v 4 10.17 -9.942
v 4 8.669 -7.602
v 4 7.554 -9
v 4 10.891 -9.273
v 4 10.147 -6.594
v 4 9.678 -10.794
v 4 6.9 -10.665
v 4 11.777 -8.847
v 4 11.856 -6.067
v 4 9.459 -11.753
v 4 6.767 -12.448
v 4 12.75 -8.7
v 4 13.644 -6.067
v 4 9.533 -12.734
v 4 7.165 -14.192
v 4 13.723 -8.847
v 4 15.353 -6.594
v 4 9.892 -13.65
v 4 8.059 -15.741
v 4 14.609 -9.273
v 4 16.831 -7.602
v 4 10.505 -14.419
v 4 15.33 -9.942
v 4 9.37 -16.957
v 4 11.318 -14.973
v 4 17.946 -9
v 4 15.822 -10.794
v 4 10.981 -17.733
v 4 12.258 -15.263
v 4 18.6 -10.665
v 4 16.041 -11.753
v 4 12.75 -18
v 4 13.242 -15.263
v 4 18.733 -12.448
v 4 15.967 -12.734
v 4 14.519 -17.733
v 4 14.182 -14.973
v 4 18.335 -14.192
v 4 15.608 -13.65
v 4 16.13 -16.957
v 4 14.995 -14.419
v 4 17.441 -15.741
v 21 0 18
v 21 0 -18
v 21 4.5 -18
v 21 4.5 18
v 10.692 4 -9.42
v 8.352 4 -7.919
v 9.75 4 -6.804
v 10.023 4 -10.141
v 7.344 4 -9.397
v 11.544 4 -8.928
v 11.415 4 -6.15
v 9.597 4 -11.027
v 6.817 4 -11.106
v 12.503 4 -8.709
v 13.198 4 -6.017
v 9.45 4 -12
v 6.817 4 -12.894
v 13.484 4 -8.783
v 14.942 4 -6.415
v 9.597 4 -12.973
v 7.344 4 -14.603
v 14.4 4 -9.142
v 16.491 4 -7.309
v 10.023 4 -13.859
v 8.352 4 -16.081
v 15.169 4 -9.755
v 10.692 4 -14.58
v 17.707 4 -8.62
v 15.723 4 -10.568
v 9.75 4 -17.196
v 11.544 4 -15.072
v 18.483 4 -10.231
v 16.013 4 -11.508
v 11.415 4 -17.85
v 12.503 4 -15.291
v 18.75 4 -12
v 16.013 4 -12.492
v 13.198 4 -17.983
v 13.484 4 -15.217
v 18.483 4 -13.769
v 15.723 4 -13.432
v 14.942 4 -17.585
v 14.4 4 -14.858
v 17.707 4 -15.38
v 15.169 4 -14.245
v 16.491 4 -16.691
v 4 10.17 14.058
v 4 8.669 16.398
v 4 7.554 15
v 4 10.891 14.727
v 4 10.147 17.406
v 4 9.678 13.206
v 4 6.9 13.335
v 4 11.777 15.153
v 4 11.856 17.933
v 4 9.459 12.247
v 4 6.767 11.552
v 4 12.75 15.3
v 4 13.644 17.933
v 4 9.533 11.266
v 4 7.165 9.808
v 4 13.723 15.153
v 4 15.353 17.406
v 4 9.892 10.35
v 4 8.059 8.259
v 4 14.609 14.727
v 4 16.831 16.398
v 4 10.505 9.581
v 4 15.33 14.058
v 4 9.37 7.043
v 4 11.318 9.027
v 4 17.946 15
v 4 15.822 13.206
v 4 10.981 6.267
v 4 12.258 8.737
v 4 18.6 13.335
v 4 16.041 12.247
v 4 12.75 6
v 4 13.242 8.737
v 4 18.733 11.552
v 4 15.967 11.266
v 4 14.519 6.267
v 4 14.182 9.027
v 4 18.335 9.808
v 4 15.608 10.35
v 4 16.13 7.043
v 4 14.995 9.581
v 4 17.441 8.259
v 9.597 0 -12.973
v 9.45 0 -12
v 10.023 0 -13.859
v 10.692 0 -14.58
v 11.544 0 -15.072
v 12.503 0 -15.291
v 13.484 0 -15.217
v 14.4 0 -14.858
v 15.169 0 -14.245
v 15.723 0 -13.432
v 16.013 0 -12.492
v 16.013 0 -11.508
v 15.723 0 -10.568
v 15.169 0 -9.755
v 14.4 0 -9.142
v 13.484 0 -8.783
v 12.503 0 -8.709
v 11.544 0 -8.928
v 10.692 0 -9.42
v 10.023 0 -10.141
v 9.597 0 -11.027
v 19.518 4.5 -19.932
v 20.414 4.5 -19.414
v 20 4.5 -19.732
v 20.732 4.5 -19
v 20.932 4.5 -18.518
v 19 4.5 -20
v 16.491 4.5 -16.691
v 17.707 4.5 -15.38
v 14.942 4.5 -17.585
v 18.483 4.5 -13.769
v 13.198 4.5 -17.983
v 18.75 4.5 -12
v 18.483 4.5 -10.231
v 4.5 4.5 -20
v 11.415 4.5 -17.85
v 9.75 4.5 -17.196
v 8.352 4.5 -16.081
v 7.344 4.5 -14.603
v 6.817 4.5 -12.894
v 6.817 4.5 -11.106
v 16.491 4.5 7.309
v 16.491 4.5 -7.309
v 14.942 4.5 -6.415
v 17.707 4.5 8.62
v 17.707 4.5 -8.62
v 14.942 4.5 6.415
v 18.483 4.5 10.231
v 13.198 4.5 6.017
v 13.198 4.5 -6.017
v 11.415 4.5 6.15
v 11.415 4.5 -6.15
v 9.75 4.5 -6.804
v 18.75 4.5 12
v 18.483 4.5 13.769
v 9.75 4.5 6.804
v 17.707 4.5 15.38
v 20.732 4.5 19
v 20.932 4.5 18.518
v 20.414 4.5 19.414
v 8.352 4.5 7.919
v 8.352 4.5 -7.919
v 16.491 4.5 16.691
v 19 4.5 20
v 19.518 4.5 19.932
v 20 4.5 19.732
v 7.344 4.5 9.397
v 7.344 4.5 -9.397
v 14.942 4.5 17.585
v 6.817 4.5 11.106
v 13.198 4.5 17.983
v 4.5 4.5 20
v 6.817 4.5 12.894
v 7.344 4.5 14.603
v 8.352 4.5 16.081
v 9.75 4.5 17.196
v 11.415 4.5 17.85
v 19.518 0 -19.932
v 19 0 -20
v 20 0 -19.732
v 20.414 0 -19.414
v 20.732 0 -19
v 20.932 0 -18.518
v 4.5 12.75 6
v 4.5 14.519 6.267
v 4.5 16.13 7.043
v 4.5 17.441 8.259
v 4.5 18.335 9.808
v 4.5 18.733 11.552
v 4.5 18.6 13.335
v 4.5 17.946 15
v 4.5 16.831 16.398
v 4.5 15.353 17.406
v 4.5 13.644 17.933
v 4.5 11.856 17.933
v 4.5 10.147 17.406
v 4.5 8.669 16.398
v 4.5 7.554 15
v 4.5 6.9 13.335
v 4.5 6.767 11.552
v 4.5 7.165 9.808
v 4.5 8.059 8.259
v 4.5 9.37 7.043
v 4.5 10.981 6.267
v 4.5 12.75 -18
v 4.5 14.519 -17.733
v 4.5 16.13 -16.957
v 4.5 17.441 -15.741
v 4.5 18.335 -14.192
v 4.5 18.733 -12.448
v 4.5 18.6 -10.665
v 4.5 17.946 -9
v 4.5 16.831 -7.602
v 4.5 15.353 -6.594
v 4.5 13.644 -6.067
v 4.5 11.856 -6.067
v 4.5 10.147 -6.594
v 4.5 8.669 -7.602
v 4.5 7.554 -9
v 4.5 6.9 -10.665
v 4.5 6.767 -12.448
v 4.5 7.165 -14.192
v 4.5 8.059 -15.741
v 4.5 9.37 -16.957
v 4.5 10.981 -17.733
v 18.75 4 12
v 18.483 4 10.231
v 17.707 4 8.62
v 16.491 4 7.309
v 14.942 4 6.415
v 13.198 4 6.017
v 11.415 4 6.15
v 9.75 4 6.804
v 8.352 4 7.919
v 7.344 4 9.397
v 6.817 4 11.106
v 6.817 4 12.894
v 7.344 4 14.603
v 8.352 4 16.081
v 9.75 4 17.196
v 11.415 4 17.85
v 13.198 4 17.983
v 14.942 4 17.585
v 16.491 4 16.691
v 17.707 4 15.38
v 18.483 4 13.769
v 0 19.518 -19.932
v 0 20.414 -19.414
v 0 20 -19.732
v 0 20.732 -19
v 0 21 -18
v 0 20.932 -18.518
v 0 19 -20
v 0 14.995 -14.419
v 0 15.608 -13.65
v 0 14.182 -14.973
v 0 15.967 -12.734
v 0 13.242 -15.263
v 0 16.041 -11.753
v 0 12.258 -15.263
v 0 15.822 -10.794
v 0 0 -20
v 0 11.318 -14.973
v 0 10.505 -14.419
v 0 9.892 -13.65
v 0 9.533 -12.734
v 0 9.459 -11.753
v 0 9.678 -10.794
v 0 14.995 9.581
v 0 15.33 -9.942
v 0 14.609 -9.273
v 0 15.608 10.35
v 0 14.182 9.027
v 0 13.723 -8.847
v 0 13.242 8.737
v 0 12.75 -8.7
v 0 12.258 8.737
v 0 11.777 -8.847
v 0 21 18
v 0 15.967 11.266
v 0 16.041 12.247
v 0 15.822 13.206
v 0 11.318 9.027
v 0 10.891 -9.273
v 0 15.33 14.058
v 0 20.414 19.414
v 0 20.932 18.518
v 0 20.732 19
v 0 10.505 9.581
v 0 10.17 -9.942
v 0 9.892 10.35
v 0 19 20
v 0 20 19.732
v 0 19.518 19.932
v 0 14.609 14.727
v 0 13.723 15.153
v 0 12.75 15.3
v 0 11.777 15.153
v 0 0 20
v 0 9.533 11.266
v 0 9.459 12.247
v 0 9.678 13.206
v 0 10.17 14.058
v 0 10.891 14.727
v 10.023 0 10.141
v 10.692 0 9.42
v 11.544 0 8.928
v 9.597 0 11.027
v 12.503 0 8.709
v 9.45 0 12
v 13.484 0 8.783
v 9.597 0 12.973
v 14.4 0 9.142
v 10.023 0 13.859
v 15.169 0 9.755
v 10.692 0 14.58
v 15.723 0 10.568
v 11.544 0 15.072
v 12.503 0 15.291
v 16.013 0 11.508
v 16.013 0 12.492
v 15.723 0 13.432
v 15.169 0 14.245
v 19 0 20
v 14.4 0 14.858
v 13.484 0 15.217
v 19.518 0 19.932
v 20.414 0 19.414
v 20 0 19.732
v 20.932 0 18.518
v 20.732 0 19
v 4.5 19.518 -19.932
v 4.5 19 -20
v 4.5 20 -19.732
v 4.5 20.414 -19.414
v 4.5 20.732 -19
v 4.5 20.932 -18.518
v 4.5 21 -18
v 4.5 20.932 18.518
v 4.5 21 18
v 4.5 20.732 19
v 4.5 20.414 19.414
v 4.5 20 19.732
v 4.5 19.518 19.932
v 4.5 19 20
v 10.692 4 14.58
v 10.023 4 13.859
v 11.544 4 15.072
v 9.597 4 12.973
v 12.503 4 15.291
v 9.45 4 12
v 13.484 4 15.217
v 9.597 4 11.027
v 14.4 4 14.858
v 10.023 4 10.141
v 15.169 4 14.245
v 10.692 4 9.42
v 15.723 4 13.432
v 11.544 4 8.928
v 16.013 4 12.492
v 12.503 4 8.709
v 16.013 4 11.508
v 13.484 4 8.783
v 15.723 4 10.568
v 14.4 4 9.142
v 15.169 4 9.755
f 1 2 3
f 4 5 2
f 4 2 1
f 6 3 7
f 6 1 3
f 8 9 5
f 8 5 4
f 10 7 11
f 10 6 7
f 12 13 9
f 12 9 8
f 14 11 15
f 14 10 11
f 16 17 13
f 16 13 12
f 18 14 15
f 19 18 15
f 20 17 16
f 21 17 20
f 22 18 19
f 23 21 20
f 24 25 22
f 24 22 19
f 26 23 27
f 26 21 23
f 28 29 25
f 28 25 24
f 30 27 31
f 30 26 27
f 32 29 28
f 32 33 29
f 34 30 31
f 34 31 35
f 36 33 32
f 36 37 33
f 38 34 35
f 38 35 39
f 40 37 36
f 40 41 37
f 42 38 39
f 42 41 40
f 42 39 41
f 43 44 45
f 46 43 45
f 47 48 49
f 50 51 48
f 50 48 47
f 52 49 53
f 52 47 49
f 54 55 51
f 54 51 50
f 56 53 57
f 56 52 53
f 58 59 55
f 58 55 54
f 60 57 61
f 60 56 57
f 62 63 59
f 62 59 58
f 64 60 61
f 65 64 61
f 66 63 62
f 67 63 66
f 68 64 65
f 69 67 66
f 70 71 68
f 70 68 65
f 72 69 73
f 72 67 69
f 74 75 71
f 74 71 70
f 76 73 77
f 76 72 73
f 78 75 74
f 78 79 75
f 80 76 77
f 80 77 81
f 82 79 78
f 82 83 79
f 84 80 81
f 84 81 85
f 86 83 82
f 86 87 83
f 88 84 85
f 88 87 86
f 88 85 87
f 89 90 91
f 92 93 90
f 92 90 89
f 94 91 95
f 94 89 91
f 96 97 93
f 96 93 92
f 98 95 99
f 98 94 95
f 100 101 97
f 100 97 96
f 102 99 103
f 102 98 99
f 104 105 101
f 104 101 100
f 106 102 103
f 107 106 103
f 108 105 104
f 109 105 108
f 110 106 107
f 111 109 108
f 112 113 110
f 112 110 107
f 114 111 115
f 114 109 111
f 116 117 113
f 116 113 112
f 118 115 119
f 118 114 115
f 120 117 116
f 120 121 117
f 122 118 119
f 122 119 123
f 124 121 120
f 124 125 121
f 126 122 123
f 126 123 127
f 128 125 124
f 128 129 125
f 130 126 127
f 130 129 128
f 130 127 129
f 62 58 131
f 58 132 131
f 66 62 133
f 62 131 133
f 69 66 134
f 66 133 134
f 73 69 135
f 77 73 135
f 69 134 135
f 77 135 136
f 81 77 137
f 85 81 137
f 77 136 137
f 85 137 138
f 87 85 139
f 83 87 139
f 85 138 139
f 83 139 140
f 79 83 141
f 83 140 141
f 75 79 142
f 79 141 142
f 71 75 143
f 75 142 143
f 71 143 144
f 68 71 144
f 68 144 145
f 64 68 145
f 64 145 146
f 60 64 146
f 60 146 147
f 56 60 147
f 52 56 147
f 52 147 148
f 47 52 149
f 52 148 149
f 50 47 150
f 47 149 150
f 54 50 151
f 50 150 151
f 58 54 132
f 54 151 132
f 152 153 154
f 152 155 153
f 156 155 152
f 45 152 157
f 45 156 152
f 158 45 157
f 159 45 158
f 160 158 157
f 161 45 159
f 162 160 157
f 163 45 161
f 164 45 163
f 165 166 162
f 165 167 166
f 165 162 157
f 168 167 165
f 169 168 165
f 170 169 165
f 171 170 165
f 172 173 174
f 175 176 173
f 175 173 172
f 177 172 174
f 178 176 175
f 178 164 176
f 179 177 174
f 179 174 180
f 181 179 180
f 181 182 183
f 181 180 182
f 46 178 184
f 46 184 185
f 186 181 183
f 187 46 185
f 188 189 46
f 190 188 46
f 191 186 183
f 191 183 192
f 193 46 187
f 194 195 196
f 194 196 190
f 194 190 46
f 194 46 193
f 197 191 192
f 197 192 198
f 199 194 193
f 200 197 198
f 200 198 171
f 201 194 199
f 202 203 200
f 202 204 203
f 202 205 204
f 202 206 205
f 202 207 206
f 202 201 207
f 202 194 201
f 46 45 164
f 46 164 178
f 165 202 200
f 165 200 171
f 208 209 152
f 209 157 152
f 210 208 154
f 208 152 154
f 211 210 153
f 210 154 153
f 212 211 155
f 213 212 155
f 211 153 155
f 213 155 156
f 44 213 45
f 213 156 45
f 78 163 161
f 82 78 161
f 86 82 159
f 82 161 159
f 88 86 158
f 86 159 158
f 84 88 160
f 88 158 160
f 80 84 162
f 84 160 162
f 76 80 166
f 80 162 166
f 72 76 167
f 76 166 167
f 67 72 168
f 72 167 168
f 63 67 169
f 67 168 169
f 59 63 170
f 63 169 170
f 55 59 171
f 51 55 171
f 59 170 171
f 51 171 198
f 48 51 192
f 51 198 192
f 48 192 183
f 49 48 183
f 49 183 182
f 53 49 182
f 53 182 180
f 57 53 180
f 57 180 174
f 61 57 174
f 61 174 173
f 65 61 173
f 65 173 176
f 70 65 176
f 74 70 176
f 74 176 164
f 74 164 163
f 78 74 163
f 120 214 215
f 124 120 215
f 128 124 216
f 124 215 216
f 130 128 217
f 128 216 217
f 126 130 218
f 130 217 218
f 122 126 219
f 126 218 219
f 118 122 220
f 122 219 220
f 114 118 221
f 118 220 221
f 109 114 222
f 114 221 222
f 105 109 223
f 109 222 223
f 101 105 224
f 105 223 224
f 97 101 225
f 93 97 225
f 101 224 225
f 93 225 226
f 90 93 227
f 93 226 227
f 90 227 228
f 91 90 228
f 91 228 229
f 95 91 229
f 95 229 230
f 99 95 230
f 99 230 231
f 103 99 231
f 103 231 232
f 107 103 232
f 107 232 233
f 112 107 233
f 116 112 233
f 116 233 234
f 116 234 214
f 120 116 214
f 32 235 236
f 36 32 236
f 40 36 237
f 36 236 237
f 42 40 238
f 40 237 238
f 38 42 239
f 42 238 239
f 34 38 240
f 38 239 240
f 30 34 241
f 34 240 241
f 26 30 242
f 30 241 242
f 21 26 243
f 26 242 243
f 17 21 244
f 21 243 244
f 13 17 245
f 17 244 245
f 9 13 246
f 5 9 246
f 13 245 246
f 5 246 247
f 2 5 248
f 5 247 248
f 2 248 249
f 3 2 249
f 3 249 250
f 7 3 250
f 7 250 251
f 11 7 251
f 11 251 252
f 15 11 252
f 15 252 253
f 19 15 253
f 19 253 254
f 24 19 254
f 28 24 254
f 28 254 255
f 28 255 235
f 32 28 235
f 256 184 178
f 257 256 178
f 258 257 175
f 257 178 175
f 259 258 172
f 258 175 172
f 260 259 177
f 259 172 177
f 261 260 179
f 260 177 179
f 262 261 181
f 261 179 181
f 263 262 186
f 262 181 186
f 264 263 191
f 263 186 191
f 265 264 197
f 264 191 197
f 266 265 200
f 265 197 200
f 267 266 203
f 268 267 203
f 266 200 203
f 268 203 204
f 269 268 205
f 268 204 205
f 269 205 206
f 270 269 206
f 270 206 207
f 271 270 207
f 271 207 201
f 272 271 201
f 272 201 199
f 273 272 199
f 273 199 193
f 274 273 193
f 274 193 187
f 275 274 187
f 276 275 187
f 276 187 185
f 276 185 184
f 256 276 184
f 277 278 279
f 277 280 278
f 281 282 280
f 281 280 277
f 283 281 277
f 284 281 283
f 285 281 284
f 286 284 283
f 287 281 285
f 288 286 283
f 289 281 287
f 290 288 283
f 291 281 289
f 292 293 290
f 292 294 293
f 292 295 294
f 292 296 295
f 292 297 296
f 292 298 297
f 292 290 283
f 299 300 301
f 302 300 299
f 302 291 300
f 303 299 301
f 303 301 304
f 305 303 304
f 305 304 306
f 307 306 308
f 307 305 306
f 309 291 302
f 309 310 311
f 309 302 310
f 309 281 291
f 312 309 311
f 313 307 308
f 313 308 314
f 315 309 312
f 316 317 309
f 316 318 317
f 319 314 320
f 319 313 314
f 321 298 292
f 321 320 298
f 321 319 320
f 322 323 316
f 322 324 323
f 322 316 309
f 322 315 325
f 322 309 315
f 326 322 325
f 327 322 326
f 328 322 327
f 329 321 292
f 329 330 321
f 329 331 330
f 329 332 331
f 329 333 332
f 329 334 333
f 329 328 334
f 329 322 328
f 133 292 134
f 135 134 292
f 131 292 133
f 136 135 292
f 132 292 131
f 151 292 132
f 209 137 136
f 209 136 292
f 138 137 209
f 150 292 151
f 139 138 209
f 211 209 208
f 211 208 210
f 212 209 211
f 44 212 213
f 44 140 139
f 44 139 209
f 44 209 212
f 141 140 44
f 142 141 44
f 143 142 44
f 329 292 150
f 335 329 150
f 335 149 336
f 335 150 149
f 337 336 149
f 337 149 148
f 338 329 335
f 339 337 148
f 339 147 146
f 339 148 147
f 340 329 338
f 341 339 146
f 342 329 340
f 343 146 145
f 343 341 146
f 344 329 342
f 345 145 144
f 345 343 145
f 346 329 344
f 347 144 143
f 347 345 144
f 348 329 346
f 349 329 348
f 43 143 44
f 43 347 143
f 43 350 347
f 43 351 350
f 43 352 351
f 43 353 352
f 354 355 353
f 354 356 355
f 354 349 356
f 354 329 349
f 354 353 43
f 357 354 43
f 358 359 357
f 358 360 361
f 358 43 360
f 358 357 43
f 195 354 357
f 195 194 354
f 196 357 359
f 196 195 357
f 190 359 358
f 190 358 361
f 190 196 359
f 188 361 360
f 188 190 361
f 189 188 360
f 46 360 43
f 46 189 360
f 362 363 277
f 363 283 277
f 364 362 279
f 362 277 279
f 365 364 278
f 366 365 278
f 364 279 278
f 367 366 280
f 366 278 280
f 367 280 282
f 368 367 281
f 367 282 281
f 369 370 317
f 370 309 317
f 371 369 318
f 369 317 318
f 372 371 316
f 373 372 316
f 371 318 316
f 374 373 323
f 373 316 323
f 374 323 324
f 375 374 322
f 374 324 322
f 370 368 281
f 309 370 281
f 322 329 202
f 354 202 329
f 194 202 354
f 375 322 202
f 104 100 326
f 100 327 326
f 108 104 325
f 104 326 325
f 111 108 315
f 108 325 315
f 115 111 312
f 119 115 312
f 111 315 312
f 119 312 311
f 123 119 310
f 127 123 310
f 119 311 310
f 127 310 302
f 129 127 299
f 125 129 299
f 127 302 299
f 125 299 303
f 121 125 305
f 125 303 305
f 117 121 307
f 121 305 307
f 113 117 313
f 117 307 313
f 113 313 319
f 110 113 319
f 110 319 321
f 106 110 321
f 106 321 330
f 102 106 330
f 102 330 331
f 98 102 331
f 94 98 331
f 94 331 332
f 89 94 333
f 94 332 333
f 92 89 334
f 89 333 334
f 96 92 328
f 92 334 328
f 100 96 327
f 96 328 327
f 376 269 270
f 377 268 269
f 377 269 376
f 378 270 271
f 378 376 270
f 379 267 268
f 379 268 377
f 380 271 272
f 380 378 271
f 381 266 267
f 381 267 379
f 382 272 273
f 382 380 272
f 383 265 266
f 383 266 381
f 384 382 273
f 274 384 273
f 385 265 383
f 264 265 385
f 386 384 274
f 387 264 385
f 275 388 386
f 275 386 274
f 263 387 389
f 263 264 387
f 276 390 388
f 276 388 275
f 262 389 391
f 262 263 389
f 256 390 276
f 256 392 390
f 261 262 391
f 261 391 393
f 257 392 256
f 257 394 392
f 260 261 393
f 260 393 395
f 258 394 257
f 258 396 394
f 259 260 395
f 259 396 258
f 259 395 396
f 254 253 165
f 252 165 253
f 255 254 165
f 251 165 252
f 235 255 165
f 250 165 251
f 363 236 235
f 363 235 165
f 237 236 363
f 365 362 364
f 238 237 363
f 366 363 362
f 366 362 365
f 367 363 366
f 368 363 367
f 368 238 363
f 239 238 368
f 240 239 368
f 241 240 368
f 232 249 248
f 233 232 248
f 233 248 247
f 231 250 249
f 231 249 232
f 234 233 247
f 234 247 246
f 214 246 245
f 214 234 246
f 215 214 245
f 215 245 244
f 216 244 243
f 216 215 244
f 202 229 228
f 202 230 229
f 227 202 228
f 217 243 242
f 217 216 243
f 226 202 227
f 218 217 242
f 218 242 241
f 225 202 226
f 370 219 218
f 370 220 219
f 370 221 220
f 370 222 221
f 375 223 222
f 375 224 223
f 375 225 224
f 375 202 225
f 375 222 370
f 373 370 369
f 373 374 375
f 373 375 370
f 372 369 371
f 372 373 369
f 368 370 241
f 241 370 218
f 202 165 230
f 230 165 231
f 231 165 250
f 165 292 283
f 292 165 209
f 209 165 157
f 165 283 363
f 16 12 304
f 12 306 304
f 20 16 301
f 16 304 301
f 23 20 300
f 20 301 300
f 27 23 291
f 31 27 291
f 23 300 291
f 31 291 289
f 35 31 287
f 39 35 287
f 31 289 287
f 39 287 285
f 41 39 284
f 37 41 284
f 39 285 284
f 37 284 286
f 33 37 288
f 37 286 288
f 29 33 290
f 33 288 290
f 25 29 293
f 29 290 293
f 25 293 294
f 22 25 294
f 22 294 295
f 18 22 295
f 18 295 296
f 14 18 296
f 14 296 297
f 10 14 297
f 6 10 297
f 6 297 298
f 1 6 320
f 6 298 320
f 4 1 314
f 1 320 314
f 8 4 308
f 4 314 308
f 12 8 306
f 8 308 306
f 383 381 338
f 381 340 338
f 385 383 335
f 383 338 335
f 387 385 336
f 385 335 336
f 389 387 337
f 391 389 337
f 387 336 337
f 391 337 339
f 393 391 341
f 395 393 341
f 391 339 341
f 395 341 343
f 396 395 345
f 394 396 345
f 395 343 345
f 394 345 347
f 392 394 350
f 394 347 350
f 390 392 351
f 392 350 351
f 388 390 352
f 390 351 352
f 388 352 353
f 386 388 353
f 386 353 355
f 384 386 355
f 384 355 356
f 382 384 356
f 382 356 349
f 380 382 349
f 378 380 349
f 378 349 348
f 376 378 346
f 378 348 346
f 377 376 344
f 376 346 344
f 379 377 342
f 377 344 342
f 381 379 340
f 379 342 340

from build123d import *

# Parameters (mm, degrees)
EXTRUDE_1_DEPTH              = 20
HOLE_WIZARD_M6_1_D           = 6.6
HOLE_WIZARD_M6_1_CBORE_D     = 12
HOLE_WIZARD_M6_1_CBORE_DEPTH = 0.5
HOLE_WIZARD_M6_2_D           = 6.6
HOLE_WIZARD_M6_2_CBORE_D     = 12
HOLE_WIZARD_M6_2_CBORE_DEPTH = 0.5
FILLET_1_R                   = 2


with BuildPart() as part:
    # 草图1 → 凸台-拉伸1 (new, symmetric)
    with BuildSketch(Plane.XY):
        Polygon((0, 21), (0, 0), (21, 0), (21, 4.5), (4.5, 4.5), (4.5, 21), align=None)
    extrude(amount=EXTRUDE_1_DEPTH, both=True)

    # M6 六角头螺栓的柱形沉头孔1 (through all)
    with Locations(Plane(origin=(0, 4.5, 0), x_dir=(1, 0, 0), z_dir=(0, 1, 0))):
        with Locations((12.75, 12), (12.75, -12)):
            CounterBoreHole(HOLE_WIZARD_M6_1_D / 2, HOLE_WIZARD_M6_1_CBORE_D / 2, HOLE_WIZARD_M6_1_CBORE_DEPTH)

    # M6 六角头螺栓的柱形沉头孔2 (through all)
    with Locations(Plane(origin=(4.5, 0, 0), x_dir=(0, 0, -1), z_dir=(1, 0, 0))):
        with Locations((12, 12.75), (-12, 12.75)):
            CounterBoreHole(HOLE_WIZARD_M6_2_D / 2, HOLE_WIZARD_M6_2_CBORE_D / 2, HOLE_WIZARD_M6_2_CBORE_DEPTH)

    # 圆角1
    fillet_1_edges = [part.edges().sort_by_distance(p)[0] for p in [
        (21, 2.25, 20),
        (2.25, 21, 20),
        (21, 2.25, -20),
        (2.25, 21, -20),
    ]]
    fillet(fillet_1_edges, radius=FILLET_1_R)


solid = part.part
